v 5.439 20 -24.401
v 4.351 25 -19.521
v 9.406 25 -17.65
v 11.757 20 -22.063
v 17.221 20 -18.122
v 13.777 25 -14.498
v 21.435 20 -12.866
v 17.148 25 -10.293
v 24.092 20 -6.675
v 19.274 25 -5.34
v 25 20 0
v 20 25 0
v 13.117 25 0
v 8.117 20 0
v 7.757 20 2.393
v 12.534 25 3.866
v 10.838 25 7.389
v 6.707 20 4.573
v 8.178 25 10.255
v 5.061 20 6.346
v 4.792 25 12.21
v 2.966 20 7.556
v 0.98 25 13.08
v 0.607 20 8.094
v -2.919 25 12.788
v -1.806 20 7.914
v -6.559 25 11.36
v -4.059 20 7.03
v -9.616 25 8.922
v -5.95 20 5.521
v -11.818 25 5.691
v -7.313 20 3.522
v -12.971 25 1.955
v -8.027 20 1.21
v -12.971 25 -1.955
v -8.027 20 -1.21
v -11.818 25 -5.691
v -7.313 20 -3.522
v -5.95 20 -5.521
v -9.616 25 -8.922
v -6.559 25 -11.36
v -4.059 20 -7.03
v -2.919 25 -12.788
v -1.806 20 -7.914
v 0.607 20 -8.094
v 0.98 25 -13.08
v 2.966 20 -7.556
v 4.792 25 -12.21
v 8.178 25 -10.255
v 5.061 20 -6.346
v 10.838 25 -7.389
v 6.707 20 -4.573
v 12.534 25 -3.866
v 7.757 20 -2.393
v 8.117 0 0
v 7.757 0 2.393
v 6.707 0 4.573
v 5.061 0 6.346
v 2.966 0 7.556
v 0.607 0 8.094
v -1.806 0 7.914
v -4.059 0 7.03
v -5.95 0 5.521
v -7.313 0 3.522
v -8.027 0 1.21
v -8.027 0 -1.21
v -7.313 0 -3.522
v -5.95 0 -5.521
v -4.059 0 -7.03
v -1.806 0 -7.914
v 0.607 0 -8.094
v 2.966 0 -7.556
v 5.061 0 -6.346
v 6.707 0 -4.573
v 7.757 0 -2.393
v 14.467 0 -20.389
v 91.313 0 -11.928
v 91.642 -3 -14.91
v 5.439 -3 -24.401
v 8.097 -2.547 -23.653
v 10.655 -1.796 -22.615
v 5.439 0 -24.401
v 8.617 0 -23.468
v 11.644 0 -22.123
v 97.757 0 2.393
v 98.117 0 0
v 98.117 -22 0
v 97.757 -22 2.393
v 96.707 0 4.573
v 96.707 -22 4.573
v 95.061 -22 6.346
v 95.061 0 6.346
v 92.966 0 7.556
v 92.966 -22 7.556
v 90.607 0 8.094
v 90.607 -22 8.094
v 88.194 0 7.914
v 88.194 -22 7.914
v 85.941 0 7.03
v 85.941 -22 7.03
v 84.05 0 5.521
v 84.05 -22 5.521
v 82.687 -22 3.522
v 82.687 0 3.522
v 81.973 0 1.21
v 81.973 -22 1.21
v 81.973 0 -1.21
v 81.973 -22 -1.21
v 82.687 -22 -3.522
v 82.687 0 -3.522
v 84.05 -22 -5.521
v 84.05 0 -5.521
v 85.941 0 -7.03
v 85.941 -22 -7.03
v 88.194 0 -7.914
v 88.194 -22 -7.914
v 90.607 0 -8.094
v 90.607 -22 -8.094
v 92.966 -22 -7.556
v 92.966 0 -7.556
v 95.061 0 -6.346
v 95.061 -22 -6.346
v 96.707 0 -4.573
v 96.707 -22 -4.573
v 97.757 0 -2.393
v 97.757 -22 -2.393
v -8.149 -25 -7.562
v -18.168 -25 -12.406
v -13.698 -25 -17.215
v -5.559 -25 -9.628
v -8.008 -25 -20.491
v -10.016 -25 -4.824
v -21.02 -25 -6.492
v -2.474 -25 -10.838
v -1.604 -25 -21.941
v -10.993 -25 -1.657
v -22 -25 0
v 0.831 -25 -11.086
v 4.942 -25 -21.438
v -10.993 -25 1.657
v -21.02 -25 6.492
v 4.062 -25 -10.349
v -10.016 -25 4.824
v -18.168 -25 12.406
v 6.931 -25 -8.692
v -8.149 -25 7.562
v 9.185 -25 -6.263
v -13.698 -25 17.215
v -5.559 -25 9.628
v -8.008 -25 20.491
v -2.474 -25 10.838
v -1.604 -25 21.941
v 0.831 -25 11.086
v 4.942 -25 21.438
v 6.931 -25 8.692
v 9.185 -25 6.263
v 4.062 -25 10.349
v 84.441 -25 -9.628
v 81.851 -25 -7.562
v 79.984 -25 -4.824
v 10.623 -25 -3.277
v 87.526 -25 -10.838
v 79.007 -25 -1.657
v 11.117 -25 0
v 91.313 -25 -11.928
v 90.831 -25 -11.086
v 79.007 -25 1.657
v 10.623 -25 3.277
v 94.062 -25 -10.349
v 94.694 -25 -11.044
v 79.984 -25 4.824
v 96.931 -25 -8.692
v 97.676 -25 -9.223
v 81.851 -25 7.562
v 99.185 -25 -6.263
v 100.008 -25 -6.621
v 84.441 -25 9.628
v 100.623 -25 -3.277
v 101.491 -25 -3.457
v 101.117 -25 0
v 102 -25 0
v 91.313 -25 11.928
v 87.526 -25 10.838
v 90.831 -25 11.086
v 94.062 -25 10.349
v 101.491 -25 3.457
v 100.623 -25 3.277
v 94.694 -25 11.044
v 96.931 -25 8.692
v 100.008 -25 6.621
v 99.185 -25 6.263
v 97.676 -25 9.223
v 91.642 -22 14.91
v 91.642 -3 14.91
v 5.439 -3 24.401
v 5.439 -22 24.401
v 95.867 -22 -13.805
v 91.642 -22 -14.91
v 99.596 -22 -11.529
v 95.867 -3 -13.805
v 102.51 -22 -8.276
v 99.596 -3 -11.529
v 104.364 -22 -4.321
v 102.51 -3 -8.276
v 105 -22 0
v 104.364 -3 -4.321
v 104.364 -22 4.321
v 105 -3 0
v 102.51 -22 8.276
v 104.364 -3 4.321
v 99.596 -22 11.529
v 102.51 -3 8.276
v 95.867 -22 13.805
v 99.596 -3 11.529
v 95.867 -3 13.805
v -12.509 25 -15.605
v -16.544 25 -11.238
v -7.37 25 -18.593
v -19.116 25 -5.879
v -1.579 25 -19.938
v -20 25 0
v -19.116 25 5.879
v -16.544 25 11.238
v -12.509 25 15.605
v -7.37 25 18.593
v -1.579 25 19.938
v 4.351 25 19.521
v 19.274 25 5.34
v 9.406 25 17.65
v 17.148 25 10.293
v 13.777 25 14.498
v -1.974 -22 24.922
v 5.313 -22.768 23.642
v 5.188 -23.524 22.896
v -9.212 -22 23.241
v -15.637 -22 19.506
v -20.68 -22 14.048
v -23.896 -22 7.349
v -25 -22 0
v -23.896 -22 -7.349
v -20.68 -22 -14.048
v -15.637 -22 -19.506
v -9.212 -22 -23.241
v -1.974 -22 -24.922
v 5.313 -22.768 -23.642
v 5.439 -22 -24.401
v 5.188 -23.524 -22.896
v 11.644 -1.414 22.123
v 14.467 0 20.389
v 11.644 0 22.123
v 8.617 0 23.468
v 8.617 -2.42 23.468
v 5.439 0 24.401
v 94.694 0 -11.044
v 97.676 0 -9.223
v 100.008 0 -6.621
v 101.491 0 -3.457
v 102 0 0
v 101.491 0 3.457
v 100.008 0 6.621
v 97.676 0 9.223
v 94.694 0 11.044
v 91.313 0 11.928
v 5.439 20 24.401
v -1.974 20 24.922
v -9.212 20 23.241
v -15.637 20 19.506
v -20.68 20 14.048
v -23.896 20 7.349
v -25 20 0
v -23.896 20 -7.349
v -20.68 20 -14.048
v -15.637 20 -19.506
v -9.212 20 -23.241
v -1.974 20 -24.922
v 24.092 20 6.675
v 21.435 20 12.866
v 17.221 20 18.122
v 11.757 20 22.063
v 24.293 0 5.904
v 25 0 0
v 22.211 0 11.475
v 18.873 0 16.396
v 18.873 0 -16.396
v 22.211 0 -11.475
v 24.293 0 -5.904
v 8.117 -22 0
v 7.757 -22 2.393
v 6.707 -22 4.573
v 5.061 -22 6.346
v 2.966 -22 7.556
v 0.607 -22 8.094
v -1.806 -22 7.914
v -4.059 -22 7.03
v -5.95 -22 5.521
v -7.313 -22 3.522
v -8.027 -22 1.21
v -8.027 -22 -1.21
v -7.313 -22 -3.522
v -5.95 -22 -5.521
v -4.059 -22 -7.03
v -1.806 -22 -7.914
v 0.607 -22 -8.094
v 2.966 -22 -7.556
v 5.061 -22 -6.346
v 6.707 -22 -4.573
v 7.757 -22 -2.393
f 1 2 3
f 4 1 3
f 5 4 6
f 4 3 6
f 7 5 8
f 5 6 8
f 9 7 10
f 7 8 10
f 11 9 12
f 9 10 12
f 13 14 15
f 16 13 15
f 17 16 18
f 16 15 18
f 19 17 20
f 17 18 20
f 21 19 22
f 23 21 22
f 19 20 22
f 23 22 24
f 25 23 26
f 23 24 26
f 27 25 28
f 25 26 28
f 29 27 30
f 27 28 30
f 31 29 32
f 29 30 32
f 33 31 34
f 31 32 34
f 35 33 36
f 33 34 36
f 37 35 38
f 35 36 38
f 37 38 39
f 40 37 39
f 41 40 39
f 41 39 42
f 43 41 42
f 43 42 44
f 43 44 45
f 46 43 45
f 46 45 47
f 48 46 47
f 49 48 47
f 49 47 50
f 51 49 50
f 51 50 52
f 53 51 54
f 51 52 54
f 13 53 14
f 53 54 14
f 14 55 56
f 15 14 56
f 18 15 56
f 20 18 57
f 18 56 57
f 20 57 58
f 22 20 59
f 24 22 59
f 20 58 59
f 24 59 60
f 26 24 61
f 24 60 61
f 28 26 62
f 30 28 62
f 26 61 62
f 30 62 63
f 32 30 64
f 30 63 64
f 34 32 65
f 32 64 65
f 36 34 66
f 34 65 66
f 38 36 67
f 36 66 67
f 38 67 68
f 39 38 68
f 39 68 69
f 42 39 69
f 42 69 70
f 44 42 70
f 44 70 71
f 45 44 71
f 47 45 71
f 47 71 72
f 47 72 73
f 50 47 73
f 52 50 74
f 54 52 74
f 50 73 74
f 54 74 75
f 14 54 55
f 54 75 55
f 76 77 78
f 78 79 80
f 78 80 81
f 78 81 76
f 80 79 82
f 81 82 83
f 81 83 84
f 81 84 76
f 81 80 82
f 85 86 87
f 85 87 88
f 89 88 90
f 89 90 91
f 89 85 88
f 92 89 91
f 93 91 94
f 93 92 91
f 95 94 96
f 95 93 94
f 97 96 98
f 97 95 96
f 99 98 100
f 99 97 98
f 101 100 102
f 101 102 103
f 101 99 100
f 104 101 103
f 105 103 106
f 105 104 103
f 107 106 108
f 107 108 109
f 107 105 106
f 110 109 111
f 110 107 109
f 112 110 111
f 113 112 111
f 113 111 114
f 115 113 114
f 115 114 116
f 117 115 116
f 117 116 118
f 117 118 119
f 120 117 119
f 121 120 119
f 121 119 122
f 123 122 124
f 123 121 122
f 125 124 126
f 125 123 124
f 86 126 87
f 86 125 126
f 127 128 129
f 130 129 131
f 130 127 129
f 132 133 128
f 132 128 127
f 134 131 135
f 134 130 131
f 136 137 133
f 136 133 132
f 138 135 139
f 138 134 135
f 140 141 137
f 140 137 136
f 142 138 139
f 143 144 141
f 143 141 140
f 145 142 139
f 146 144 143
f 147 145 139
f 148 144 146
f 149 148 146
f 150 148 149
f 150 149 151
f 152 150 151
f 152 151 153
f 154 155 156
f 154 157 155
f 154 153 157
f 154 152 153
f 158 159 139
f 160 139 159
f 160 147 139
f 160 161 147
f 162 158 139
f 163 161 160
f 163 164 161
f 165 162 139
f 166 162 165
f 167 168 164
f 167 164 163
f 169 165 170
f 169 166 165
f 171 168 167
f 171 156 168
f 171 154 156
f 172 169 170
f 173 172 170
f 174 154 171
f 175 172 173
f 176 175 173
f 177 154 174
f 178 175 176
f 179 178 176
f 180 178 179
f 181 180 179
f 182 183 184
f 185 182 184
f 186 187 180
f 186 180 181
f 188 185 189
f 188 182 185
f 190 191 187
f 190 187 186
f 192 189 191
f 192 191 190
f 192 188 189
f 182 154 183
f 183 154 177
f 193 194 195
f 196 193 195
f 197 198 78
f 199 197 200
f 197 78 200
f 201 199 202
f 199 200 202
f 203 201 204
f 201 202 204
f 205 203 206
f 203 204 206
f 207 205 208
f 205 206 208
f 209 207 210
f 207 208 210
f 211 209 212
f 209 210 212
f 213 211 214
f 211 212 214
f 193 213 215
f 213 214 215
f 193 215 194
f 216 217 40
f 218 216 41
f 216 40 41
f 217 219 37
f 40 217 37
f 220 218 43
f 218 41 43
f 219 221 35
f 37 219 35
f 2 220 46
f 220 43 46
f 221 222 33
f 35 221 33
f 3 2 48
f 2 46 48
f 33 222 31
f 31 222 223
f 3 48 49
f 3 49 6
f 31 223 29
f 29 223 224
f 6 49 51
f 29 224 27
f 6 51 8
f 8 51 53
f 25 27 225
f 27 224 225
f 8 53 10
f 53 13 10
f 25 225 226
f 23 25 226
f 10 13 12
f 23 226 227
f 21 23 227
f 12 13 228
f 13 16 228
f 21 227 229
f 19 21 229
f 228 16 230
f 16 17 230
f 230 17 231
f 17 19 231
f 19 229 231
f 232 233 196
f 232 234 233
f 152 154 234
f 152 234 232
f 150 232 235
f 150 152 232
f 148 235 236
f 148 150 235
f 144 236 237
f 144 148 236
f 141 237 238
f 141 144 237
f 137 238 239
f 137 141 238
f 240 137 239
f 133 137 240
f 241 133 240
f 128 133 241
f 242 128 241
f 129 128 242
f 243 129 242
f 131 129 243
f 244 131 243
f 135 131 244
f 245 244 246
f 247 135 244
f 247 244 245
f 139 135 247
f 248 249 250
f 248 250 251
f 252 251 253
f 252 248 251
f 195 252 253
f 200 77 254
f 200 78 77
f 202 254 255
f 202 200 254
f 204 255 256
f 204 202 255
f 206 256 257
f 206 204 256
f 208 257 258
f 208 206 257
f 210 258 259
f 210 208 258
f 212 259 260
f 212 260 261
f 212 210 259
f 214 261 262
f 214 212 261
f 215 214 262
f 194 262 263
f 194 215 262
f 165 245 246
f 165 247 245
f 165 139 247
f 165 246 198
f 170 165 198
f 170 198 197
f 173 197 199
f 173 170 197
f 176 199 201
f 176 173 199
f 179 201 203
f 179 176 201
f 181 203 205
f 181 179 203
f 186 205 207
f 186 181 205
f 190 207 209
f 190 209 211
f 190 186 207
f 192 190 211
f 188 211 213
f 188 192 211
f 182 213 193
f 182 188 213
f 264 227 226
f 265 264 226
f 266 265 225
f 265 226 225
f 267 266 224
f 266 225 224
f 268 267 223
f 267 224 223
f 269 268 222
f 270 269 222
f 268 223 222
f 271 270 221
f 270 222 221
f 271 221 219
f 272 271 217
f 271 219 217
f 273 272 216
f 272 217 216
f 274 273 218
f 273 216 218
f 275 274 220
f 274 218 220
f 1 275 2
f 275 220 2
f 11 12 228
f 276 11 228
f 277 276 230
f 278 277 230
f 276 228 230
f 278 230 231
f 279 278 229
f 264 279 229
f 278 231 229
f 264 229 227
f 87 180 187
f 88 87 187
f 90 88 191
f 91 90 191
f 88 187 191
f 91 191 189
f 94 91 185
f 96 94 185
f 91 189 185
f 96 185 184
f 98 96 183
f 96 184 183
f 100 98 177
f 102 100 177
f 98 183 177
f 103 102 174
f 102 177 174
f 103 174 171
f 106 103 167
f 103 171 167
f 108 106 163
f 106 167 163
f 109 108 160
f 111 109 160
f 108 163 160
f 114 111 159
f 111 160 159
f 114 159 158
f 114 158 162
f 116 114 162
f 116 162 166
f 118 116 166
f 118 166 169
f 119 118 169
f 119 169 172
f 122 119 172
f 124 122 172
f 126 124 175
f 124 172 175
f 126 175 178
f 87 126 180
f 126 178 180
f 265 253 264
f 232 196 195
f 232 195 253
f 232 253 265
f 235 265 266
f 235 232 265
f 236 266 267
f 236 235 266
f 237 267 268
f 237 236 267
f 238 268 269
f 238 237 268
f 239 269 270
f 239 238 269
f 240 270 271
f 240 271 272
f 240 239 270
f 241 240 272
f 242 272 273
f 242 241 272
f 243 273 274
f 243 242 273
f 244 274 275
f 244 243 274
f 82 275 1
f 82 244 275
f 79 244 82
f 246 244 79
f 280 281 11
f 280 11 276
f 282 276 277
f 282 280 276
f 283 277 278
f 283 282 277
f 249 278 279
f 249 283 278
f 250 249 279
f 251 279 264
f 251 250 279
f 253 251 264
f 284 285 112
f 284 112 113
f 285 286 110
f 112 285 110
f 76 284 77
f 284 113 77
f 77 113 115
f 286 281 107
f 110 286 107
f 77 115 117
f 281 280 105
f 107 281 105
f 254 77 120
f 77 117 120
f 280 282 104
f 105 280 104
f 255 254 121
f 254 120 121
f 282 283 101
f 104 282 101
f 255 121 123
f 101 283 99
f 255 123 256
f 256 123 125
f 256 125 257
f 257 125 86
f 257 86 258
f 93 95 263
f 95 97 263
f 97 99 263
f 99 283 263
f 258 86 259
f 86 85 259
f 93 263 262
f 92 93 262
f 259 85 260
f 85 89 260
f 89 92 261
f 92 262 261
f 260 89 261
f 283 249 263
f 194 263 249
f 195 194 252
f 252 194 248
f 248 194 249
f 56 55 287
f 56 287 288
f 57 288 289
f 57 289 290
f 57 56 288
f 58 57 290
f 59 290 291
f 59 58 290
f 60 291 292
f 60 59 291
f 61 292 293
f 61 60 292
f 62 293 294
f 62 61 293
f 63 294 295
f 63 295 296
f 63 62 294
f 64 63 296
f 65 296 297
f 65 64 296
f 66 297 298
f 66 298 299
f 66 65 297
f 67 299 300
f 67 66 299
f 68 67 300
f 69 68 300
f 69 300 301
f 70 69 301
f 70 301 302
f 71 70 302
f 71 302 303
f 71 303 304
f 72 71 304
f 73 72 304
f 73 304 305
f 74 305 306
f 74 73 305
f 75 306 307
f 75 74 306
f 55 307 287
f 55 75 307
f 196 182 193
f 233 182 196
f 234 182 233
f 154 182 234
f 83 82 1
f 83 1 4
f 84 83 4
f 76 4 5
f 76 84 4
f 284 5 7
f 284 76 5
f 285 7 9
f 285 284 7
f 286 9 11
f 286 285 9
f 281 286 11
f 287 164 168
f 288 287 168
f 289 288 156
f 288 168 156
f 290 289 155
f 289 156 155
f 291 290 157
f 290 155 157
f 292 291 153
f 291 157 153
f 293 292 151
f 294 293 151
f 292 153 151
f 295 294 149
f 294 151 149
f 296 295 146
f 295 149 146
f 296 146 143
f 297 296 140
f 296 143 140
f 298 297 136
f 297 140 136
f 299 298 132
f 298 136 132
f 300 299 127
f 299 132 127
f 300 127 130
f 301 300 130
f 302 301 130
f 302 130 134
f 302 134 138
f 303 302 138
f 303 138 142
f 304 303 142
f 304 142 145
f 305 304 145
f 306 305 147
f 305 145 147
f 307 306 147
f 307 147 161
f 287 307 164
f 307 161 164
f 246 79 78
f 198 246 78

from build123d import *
from build123d import SkipClean  # not in build123d's __all__

# Parameters (mm, degrees)
F0_R         = 8.117177454
F1_DEPTH     = 25
F2_SIZE      = 3
F3_DEPTH     = 25
F4_SIZE      = 5
F5_T4_DEPTH  = 109.868464735
F5_S5_R      = 25
F5_T6_DEPTH  = 57
F5_T8_ANGLE  = 167.4336377222
F5_T12_DEPTH = 109.868464735
F5_S13_R     = 25
F5_T14_DEPTH = 57


# Not quite as in the source:
# - a fillet or chamfer that OpenCascade refuses, or shapes differently, is made with other operations: its cross-section is extruded or revolved along the edge and cut away or added


with BuildPart() as f1:
    # F0 (on Front) → F1 (new body)
    with BuildSketch(Plane.XZ):
        with BuildLine():
            ThreePointArc((5.4392563458, -24.4011165811), (19.5061709293, -15.6367930113), (25, 0))
            ThreePointArc((25, 0), (19.5061709293, 15.6367930113), (5.4392563458, 24.4011165811))
            ThreePointArc((5.4392563458, 24.4011165811), (-25, 0), (5.4392563458, -24.4011165811))
        make_face()
        Circle(F0_R, mode=Mode.SUBTRACT)
        with BuildLine():
            ThreePointArc((5.4392563458, 24.4011165811), (19.5061709293, 15.6367930113), (25, 0))
            ThreePointArc((25, 0), (19.5061709293, -15.6367930113), (5.4392563458, -24.4011165811))
            Line((5.4392563458, -24.4011165811), (91.6416380189, -14.909896868))
            ThreePointArc((91.6416380189, -14.909896868), (75, 0), (91.6416380189, 14.909896868))
            Line((91.6416380189, 14.909896868), (5.4392563458, 24.4011165811))
        make_face()
        with BuildLine():
            ThreePointArc((105, 0), (101.1719418698, 10.0093813424), (91.6416380189, 14.909896868))
            ThreePointArc((91.6416380189, 14.909896868), (75, 0), (91.6416380189, -14.909896868))
            ThreePointArc((91.6416380189, -14.909896868), (101.1719418698, -10.0093813424), (105, 0))
        make_face()
        with Locations((90, 0)):
            Circle(F0_R, mode=Mode.SUBTRACT)
    extrude(amount=F1_DEPTH)

    # F2
    f2_edges = [f1.edges().sort_by_distance(p)[0] for p in [
        (-25, -25, 0),
        (48.540447, -25, -19.655507),
        (105, -25, 0),
        (48.540447, -25, 19.655507),
        (-8.117177, -25, 0),
        (81.882823, -25, 0),
    ]]
    chamfer(f2_edges, length=F2_SIZE)

    # F0 (on Front) → F3 (join)
    with BuildSketch(Plane.XZ):
        with BuildLine():
            ThreePointArc((5.4392563458, -24.4011165811), (19.5061709293, -15.6367930113), (25, 0))
            ThreePointArc((25, 0), (19.5061709293, 15.6367930113), (5.4392563458, 24.4011165811))
            ThreePointArc((5.4392563458, 24.4011165811), (-25, 0), (5.4392563458, -24.4011165811))
        make_face()
        Circle(F0_R, mode=Mode.SUBTRACT)
    with SkipClean():  # cleaning this boolean's faces spoils the solid; the shape is the same uncleaned
        extrude(amount=-F3_DEPTH)

    # F4
    f4_edges = [f1.edges().sort_by_distance(p)[0] for p in [
        (-5.439256, 25, 24.401117),
        (-8.117177, 25, 0),
    ]]
    chamfer(f4_edges, length=F4_SIZE)

    # F5: chamfer of 3 on 1 edges, made by hand


with BuildPart() as f5_tool2:
    # F5_s3 → F5_t4 (new body)
    with BuildSketch(Plane(origin=(88.922009846, 0, -9.7906614225), x_dir=(0, 1, 0), z_dir=(-0.9939931245, 0, 0.1094425346))):
        Polygon((0, -21.8498281134), (-3, -24.8498281134), (0, -24.8498281134), align=None)
    extrude(amount=F5_T4_DEPTH)

    # F5_s5 → F5_t6 (cut, symmetric)
    with BuildSketch(Plane.XZ.offset(1.5)):
        Circle(F5_S5_R)
    extrude(amount=F5_T6_DEPTH, both=True, mode=Mode.SUBTRACT)


with BuildPart() as f1_1:
    add(f1.part, clean=False)

    # F5_t1: cut F5_tool2
    add(f5_tool2.part, mode=Mode.SUBTRACT)

    # F5_s7 → F5_t8 (revolve, cut)
    with BuildSketch(Plane(origin=(88.922009846, 0, 9.7906614225), x_dir=(0, 1, 0), z_dir=(-0.9939931245, 0, -0.1094425346))):
        Polygon((0, 21.8498281134), (-3, 24.8498281134), (0, 24.8498281134), align=None)
    revolve(axis=Axis((90, 0, 0), (0, -1, 0)), revolution_arc=F5_T8_ANGLE, mode=Mode.SUBTRACT)


with BuildPart() as f5_tool10:
    # F5_s11 → F5_t12 (new body)
    with BuildSketch(Plane(origin=(-20.2864887038, 0, -2.2336218299), x_dir=(0, 1, 0), z_dir=(0.9939931245, 0, 0.1094425346))):
        Polygon((0, -21.8498281134), (-3, -24.8498281134), (0, -24.8498281134), align=None)
    extrude(amount=F5_T12_DEPTH)

    # F5_s13 → F5_t14 (cut, symmetric)
    with BuildSketch(Plane.XZ.offset(1.5)):
        Circle(F5_S13_R)
    extrude(amount=F5_T14_DEPTH, both=True, mode=Mode.SUBTRACT)


with BuildPart() as f1_2:
    add(f1_1.part, clean=False)

    # F5_t9: cut F5_tool10
    add(f5_tool10.part, mode=Mode.SUBTRACT)


solid = f1_2.part
